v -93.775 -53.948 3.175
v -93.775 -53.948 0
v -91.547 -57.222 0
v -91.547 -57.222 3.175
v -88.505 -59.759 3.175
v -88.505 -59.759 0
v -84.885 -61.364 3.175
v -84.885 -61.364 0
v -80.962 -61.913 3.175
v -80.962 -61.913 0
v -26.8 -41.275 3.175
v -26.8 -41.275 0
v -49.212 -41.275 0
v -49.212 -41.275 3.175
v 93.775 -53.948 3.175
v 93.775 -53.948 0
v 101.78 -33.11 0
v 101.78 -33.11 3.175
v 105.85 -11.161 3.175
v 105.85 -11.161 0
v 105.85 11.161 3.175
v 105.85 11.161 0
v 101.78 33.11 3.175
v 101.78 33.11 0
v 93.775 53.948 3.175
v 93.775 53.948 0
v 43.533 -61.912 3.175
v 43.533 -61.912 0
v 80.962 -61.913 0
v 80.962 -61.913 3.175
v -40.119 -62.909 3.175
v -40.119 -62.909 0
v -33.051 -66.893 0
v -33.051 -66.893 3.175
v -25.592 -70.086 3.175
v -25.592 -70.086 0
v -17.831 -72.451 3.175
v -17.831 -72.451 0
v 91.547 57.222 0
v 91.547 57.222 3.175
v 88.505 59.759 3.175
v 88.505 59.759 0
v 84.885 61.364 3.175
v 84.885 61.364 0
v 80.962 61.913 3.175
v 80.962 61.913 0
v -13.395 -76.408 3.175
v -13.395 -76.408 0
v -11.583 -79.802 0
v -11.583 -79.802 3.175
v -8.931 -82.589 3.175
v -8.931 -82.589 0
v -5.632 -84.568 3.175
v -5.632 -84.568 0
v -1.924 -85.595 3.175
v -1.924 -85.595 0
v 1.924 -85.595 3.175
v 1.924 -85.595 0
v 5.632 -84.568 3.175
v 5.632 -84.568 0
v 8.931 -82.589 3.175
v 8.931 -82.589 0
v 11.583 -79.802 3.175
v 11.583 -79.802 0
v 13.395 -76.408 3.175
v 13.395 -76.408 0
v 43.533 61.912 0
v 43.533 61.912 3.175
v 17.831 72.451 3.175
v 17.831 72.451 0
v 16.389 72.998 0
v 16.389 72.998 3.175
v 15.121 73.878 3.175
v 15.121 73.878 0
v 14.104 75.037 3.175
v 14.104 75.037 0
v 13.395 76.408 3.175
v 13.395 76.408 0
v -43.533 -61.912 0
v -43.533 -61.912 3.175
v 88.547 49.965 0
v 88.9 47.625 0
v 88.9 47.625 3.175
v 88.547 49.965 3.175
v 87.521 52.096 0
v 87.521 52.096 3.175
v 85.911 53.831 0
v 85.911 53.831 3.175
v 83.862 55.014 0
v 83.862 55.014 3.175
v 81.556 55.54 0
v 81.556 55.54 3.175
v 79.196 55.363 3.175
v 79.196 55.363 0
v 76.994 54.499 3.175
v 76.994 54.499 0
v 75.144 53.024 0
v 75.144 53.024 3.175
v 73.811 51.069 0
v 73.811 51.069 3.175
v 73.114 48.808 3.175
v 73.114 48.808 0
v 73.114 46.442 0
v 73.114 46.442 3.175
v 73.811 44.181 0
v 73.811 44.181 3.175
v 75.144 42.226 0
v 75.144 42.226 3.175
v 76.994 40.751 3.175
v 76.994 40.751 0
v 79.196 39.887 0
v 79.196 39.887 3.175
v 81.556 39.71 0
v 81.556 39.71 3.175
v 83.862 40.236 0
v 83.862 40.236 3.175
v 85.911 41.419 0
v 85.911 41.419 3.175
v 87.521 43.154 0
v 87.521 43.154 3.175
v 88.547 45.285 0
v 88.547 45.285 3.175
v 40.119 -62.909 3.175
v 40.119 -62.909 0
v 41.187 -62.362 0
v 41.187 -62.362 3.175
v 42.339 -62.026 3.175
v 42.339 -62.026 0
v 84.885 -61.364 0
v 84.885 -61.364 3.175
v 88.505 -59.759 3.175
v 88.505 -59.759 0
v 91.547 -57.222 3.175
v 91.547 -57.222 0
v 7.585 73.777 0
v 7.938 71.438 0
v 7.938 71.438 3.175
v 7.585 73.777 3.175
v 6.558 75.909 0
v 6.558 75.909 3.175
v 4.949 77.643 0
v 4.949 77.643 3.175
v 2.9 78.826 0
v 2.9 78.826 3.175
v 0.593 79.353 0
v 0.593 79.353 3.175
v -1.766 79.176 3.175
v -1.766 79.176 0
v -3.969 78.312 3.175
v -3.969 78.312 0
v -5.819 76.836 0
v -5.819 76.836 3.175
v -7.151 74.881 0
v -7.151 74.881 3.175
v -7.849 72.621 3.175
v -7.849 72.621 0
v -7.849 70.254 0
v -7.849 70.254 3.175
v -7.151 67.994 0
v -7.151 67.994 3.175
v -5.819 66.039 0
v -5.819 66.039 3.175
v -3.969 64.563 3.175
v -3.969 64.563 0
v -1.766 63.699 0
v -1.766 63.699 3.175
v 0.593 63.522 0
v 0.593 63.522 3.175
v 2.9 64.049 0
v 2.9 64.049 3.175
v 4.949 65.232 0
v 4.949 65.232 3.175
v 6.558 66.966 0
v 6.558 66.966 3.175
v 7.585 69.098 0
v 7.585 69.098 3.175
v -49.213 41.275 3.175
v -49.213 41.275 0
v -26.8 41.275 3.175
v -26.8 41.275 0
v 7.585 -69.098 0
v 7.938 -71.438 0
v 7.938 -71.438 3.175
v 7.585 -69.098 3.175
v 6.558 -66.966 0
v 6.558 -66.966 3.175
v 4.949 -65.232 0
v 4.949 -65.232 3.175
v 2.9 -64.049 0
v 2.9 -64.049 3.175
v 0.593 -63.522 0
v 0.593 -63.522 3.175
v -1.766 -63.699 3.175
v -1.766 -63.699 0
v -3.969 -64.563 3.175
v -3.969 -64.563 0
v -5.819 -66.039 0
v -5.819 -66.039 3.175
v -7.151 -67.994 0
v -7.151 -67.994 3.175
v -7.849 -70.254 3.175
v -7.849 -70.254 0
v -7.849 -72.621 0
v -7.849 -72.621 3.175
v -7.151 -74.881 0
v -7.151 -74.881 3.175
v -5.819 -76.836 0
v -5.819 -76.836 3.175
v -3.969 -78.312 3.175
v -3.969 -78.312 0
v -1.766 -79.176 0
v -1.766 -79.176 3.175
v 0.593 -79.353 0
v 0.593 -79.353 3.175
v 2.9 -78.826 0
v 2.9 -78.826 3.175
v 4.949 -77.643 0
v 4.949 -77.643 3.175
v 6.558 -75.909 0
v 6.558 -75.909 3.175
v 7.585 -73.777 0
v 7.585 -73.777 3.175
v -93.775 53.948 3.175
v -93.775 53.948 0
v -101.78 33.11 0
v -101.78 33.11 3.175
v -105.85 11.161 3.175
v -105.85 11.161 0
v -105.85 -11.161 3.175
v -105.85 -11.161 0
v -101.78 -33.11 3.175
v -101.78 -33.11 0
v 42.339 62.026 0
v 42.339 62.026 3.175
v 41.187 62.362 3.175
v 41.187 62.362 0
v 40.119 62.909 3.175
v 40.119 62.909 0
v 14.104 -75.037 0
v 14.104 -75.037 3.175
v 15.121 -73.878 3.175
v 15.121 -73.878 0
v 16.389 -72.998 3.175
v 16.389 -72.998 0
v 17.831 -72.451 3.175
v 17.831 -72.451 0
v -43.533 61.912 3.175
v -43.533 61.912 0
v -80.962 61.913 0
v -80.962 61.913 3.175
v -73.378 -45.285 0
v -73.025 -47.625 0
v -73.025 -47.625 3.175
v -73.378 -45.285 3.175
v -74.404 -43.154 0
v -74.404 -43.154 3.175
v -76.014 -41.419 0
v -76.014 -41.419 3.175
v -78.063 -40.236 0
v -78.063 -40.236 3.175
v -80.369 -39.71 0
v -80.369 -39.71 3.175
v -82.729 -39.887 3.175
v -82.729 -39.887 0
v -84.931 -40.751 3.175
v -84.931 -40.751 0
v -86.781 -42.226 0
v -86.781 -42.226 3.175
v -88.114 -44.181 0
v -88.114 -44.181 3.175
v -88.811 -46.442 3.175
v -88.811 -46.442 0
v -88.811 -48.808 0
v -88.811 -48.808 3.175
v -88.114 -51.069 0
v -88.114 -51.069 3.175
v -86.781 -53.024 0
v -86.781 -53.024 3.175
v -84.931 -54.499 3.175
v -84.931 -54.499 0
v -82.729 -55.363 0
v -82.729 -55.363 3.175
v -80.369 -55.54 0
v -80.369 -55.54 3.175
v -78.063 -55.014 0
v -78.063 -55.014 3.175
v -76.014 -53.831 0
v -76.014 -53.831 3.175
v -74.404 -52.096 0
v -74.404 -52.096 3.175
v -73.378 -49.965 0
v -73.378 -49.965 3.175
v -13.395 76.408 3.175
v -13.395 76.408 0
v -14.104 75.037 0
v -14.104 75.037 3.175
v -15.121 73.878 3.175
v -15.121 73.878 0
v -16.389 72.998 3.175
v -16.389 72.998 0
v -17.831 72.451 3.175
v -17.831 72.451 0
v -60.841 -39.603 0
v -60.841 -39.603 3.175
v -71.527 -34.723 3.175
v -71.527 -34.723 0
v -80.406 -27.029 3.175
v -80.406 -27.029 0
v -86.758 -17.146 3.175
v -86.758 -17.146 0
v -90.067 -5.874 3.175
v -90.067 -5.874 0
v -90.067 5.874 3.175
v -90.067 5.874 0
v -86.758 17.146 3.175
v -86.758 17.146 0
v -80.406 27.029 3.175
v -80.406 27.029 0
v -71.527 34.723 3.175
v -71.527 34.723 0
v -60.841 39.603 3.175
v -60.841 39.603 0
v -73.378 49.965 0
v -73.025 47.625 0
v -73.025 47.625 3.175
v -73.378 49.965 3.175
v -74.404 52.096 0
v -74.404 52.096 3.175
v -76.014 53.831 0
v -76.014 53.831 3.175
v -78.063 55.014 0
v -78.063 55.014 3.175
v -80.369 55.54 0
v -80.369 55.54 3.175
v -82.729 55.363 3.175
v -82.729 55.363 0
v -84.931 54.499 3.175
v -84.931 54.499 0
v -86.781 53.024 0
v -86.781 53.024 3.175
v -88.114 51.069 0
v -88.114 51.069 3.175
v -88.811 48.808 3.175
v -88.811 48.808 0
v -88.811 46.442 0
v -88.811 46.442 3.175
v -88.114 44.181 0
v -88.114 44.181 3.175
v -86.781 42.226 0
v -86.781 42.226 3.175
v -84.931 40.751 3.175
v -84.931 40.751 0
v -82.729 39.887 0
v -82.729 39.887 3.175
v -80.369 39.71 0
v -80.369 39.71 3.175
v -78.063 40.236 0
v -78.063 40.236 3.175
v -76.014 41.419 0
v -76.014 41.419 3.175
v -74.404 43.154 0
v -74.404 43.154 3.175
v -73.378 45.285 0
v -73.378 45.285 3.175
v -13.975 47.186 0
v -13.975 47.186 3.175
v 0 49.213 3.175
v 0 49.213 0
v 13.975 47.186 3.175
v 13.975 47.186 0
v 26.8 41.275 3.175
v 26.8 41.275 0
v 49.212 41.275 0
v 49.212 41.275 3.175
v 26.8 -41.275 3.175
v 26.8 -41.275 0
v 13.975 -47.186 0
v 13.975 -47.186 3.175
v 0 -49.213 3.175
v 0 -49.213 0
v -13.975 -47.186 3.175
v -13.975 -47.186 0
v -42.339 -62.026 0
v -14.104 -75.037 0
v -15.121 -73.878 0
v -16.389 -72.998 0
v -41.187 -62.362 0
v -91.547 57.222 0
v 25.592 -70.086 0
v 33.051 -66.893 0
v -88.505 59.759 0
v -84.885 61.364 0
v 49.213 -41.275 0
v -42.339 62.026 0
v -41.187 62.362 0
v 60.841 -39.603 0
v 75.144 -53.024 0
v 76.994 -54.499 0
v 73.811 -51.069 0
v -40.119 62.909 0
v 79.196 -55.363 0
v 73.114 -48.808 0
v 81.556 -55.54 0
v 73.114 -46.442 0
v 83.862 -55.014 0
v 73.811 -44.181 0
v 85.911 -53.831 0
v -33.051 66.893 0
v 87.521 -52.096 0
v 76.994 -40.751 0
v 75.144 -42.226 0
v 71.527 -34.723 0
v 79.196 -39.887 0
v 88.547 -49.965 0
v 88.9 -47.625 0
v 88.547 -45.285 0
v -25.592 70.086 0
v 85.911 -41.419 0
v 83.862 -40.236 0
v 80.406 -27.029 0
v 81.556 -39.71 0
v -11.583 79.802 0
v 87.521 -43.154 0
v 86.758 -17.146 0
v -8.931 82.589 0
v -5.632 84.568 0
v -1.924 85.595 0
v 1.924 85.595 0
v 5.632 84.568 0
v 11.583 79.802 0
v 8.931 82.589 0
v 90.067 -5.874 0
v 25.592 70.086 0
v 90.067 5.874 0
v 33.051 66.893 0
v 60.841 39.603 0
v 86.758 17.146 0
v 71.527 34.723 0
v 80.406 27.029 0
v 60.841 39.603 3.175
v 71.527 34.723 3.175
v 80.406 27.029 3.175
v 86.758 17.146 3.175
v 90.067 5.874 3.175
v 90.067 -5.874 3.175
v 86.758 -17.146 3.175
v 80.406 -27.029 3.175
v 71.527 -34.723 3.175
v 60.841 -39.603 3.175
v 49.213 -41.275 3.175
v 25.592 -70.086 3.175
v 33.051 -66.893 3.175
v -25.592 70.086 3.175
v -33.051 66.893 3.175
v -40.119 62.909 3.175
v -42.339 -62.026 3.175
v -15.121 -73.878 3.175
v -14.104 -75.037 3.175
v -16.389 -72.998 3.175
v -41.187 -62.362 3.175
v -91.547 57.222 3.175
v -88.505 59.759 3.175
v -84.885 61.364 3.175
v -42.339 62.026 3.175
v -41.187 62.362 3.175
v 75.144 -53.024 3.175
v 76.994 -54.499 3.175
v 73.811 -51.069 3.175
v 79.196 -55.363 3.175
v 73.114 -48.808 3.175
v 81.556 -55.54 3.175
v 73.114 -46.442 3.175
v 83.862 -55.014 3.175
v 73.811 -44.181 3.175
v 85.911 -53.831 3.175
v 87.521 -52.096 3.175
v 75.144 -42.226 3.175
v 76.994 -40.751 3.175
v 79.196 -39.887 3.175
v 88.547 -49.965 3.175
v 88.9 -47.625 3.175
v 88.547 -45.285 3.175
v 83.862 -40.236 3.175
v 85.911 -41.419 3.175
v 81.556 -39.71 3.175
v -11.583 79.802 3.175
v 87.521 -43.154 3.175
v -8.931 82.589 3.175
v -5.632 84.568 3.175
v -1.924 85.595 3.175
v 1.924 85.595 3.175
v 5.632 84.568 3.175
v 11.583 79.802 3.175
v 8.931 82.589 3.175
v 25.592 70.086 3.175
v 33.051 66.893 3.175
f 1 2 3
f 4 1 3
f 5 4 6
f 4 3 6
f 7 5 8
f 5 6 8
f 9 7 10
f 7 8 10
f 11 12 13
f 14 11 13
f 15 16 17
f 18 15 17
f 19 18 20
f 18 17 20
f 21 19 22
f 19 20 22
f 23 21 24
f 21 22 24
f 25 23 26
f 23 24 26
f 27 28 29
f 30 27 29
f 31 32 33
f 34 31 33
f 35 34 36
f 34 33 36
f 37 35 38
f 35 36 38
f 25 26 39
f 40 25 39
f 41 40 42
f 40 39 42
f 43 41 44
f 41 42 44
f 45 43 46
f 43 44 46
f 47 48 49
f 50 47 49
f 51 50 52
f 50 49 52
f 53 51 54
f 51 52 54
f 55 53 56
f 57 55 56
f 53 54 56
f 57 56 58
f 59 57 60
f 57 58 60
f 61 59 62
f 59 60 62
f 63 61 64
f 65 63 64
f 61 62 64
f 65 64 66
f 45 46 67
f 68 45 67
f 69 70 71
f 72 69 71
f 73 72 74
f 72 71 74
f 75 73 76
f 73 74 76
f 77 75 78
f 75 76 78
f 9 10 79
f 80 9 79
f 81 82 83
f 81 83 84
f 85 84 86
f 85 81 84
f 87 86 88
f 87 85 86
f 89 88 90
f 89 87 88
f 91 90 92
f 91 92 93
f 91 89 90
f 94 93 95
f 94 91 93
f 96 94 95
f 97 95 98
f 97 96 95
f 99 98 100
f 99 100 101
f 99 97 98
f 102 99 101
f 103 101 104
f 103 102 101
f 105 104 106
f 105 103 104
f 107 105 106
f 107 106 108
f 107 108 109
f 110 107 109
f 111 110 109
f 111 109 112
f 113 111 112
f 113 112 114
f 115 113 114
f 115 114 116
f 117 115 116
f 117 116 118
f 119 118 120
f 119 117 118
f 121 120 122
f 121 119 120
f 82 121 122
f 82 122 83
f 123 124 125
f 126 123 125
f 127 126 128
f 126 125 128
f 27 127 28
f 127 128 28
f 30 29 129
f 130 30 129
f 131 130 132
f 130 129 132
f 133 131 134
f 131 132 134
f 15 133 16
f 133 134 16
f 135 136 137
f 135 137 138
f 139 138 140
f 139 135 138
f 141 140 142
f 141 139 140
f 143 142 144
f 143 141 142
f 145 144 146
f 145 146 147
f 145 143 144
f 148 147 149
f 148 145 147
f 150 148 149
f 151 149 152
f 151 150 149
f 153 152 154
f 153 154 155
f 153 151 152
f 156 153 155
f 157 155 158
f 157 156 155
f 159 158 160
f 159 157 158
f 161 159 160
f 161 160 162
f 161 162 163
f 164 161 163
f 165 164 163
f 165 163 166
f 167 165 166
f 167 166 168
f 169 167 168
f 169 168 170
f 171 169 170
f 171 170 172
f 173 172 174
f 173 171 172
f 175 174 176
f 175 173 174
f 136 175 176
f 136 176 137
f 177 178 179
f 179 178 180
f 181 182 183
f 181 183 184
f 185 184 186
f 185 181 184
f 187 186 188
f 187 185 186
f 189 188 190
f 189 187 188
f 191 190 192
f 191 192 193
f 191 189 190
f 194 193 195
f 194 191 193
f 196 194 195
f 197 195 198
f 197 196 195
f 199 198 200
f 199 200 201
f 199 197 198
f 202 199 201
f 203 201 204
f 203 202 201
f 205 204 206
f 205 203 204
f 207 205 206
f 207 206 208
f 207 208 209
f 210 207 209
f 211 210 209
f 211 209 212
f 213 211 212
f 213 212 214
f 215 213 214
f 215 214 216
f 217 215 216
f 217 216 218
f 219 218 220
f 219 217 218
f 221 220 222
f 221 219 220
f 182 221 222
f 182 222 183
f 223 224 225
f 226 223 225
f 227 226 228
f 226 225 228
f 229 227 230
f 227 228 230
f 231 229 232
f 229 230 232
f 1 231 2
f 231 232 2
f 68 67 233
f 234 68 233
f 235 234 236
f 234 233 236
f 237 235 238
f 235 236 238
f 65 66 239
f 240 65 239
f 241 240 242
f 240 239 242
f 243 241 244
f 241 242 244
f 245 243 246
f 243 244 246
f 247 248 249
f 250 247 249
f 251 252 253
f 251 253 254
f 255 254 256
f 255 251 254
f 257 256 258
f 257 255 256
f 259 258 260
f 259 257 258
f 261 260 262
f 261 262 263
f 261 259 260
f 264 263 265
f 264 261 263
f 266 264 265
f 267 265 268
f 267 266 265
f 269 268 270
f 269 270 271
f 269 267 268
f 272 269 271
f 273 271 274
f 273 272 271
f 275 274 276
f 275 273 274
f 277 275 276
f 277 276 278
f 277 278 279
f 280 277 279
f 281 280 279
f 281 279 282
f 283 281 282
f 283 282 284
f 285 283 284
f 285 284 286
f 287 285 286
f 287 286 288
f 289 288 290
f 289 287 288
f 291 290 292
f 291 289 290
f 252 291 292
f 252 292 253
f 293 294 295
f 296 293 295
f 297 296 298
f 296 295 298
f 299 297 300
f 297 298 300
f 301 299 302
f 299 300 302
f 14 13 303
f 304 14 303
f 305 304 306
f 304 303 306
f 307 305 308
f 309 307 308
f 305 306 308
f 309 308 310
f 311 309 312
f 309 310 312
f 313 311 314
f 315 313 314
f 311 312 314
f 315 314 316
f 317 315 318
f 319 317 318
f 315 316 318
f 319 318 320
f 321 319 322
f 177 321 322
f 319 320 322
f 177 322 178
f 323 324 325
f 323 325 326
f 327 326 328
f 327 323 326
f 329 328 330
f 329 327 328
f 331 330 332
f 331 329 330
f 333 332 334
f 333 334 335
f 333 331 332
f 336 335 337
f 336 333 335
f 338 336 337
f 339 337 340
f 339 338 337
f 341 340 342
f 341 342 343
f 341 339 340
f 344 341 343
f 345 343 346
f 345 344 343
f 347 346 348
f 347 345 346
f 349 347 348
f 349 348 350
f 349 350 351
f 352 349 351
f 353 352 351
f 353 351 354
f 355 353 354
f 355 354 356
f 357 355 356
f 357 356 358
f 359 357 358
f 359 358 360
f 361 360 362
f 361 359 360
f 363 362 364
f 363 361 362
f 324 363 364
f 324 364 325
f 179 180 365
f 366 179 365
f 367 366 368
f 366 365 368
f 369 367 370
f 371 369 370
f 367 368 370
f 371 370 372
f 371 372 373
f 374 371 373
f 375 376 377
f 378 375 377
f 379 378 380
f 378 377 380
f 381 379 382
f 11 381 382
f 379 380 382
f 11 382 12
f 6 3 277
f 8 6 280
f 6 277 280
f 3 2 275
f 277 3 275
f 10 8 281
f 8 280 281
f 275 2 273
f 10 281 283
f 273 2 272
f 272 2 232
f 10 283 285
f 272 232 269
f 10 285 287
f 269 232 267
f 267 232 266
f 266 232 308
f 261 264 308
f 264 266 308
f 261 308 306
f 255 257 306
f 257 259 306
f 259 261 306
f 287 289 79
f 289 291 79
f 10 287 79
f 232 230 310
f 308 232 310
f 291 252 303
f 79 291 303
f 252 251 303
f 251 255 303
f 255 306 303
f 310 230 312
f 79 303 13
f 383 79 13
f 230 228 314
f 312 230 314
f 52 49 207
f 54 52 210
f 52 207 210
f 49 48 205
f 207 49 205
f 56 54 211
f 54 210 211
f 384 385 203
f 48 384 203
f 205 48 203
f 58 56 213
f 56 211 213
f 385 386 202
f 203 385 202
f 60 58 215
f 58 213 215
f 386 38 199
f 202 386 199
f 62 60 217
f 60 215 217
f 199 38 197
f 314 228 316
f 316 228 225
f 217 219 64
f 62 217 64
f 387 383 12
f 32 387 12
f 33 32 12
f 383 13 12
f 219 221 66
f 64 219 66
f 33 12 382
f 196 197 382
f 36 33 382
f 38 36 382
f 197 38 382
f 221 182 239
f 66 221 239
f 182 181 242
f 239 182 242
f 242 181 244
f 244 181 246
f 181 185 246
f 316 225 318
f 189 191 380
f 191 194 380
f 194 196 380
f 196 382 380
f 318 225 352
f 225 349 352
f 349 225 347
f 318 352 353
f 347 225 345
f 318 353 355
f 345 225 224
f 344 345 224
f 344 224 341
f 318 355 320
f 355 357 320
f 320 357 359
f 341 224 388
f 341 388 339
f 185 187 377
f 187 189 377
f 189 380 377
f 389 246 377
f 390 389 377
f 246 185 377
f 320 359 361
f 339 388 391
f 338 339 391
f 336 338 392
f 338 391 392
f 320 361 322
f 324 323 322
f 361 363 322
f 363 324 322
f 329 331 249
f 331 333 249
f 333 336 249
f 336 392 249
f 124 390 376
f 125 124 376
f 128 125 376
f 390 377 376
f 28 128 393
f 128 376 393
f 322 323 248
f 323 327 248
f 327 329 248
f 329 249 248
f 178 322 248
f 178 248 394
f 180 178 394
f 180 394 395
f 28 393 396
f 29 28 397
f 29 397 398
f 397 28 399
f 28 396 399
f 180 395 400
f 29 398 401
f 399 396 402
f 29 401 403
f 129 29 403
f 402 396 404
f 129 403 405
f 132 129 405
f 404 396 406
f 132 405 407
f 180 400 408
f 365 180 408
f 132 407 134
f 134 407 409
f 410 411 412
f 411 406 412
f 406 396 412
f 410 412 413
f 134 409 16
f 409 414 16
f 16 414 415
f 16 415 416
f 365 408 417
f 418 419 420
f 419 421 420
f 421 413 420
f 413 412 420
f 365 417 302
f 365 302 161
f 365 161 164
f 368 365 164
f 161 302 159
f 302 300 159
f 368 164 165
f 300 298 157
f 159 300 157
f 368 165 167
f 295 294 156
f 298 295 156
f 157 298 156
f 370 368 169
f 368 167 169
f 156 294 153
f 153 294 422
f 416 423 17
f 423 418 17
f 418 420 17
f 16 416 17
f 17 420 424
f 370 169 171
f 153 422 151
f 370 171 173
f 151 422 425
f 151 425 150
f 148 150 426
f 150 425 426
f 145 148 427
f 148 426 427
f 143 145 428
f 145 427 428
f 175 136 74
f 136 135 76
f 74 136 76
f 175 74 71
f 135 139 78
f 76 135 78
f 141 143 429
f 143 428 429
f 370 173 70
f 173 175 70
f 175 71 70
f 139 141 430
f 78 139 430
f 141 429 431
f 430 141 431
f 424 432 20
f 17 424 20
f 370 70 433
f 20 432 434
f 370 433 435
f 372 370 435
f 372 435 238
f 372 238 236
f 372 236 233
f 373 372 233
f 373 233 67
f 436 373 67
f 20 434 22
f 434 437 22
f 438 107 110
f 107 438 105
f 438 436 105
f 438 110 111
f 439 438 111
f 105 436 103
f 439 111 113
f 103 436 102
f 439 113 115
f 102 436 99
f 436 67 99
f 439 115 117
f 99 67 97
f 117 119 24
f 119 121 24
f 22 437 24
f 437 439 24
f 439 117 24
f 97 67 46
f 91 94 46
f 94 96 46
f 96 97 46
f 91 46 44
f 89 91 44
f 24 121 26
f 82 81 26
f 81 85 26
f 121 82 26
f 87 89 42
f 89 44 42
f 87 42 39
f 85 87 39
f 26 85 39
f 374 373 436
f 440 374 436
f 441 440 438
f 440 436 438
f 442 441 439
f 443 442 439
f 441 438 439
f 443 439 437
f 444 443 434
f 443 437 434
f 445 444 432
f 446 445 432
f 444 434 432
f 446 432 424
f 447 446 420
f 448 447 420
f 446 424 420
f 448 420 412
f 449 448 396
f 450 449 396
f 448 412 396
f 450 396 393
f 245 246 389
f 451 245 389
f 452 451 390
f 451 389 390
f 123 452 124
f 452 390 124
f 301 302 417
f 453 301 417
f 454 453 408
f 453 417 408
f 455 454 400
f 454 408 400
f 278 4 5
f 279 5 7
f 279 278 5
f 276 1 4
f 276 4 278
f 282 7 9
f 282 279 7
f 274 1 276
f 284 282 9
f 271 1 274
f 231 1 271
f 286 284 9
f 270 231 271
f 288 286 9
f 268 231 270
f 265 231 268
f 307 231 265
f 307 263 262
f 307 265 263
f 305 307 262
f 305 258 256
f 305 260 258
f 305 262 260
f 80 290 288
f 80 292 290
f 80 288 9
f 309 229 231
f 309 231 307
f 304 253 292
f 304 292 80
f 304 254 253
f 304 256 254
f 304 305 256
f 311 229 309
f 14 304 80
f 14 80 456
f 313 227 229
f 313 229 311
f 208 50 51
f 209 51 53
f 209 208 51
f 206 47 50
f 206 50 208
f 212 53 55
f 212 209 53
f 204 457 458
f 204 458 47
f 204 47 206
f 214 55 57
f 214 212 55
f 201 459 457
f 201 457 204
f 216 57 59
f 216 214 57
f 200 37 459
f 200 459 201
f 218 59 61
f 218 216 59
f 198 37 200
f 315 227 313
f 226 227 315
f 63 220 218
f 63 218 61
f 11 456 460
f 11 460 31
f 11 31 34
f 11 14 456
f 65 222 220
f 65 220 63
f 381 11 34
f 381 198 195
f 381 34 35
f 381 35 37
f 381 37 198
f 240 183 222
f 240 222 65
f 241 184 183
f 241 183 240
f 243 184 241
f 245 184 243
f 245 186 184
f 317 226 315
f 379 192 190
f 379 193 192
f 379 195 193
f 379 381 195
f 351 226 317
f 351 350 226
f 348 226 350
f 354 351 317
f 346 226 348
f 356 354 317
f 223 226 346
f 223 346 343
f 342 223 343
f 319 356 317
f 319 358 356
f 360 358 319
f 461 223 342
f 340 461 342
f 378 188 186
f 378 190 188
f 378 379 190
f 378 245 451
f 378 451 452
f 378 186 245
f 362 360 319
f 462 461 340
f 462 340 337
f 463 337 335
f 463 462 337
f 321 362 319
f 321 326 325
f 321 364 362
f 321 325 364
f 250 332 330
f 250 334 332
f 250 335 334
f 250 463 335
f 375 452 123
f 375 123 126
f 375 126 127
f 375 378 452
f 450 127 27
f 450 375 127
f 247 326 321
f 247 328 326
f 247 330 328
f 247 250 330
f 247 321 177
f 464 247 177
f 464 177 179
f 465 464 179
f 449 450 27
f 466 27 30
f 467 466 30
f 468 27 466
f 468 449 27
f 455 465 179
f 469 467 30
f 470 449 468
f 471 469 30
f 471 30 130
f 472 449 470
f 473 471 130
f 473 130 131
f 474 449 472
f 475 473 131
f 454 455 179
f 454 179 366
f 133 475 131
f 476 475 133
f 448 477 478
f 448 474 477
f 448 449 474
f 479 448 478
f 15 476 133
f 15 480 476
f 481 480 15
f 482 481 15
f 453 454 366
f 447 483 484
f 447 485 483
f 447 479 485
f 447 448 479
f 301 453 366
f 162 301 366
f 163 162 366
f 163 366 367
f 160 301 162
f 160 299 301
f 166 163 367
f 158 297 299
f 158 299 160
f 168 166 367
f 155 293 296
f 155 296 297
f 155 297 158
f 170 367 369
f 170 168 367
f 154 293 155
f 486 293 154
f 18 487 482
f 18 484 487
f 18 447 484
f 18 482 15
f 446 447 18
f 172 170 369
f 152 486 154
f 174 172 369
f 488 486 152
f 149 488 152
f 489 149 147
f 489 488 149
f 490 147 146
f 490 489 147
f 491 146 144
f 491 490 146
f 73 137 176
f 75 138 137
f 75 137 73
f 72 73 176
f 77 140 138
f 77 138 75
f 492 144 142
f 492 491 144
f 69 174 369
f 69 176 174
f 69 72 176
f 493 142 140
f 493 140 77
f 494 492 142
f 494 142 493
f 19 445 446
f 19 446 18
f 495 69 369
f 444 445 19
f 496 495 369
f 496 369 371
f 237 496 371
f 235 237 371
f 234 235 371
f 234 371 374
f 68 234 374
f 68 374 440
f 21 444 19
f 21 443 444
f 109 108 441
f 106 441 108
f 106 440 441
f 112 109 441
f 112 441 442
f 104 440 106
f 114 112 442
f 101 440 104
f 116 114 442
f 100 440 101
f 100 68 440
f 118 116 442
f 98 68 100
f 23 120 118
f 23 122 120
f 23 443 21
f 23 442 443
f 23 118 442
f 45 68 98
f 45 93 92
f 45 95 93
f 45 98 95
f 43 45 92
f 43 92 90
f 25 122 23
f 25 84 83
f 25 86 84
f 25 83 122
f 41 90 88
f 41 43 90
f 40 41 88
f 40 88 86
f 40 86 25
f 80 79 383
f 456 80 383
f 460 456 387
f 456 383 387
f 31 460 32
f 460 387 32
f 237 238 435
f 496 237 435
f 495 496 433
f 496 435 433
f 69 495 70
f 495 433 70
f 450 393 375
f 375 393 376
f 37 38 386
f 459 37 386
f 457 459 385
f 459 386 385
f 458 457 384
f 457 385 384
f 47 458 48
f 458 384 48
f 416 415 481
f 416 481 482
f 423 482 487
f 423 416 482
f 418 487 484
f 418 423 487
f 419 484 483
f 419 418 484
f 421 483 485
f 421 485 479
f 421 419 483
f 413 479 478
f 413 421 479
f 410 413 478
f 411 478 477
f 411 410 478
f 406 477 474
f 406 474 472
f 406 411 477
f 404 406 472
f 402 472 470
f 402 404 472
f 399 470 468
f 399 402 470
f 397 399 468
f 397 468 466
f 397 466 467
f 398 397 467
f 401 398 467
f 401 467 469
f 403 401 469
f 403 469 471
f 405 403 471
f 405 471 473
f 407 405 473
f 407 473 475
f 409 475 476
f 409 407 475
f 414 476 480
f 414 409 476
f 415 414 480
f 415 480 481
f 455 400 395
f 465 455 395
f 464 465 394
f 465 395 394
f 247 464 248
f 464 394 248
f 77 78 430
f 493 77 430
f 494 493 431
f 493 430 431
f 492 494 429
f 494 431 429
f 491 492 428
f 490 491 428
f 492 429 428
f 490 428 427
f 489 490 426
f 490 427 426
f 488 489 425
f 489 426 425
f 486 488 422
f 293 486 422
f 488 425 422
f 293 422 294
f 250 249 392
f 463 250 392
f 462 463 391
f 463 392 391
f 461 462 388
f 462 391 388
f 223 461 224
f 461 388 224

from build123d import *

# Parameters (mm, degrees)
F0_R     = 7.9375
F1_DEPTH = 3.175


with BuildPart() as f1:
    # F0 (on Top) → F1 (new body)
    with BuildSketch(Plane.XY):
        with BuildLine():
            Line((-43.533407, 61.9125), (-80.9625, 61.9125))
            ThreePointArc((-80.9625, 61.9125), (-88.505359, 59.759164), (-93.774579, 53.948235))
            ThreePointArc((-93.774579, 53.948235), (-106.3625, 0), (-93.774579, -53.948235))
            ThreePointArc((-93.774579, -53.948235), (-88.505359, -59.759164), (-80.9625, -61.9125))
            Line((-80.9625, -61.9125), (-43.533407, -61.9125))
            ThreePointArc((-43.533407, -61.9125), (-41.755051, -62.166604), (-40.119022, -62.908578))
            ThreePointArc((-40.119022, -62.908578), (-29.365201, -68.59089), (-17.831054, -72.450526))
            ThreePointArc((-17.831054, -72.450526), (-15.121491, -73.877949), (-13.395178, -76.407596))
            ThreePointArc((-13.395178, -76.407596), (0, -85.725), (13.395178, -76.407596))
            ThreePointArc((13.395178, -76.407596), (15.121491, -73.877949), (17.831054, -72.450526))
            ThreePointArc((17.831054, -72.450526), (29.365201, -68.59089), (40.119022, -62.908578))
            ThreePointArc((40.119022, -62.908578), (41.755051, -62.166604), (43.533407, -61.9125))
            Line((43.533407, -61.9125), (80.9625, -61.9125))
            ThreePointArc((80.9625, -61.9125), (88.505359, -59.759164), (93.774579, -53.948235))
            ThreePointArc((93.774579, -53.948235), (106.3625, 0), (93.774579, 53.948235))
            ThreePointArc((93.774579, 53.948235), (88.505359, 59.759164), (80.9625, 61.9125))
            Line((80.9625, 61.9125), (43.533407, 61.9125))
            ThreePointArc((43.533407, 61.9125), (41.755051, 62.166604), (40.119022, 62.908578))
            ThreePointArc((40.119022, 62.908578), (29.365201, 68.59089), (17.831054, 72.450526))
            ThreePointArc((17.831054, 72.450526), (15.121491, 73.877949), (13.395178, 76.407596))
            ThreePointArc((13.395178, 76.407596), (0, 85.725), (-13.395178, 76.407596))
            ThreePointArc((-13.395178, 76.407596), (-15.121491, 73.877949), (-17.831054, 72.450526))
            ThreePointArc((-17.831054, 72.450526), (-29.365201, 68.59089), (-40.119022, 62.908578))
            ThreePointArc((-40.119022, 62.908578), (-41.755051, 62.166604), (-43.533407, 61.9125))
        make_face()
        with Locations((-80.9625, -47.625)):
            Circle(F0_R, mode=Mode.SUBTRACT)
        with Locations((0, -71.4375)):
            Circle(F0_R, mode=Mode.SUBTRACT)
        with Locations((80.9625, -47.625)):
            Circle(F0_R, mode=Mode.SUBTRACT)
        with Locations((-80.9625, 47.625)):
            Circle(F0_R, mode=Mode.SUBTRACT)
        with BuildLine():
            ThreePointArc((26.800085, -41.275), (0, -49.2125), (-26.800085, -41.275))
            Line((-26.800085, -41.275), (-49.2125, -41.275))
            ThreePointArc((-49.2125, -41.275), (-90.4875, 0), (-49.2125, 41.275))
            Line((-49.2125, 41.275), (-26.800085, 41.275))
            ThreePointArc((-26.800085, 41.275), (0, 49.2125), (26.800085, 41.275))
            Line((26.800085, 41.275), (49.2125, 41.275))
            ThreePointArc((49.2125, 41.275), (90.4875, 0), (49.2125, -41.275))
            Line((49.2125, -41.275), (26.800085, -41.275))
        make_face(mode=Mode.SUBTRACT)
        with Locations((0, 71.4375)):
            Circle(F0_R, mode=Mode.SUBTRACT)
        with Locations((80.9625, 47.625)):
            Circle(F0_R, mode=Mode.SUBTRACT)
    extrude(amount=F1_DEPTH)


solid = f1.part
